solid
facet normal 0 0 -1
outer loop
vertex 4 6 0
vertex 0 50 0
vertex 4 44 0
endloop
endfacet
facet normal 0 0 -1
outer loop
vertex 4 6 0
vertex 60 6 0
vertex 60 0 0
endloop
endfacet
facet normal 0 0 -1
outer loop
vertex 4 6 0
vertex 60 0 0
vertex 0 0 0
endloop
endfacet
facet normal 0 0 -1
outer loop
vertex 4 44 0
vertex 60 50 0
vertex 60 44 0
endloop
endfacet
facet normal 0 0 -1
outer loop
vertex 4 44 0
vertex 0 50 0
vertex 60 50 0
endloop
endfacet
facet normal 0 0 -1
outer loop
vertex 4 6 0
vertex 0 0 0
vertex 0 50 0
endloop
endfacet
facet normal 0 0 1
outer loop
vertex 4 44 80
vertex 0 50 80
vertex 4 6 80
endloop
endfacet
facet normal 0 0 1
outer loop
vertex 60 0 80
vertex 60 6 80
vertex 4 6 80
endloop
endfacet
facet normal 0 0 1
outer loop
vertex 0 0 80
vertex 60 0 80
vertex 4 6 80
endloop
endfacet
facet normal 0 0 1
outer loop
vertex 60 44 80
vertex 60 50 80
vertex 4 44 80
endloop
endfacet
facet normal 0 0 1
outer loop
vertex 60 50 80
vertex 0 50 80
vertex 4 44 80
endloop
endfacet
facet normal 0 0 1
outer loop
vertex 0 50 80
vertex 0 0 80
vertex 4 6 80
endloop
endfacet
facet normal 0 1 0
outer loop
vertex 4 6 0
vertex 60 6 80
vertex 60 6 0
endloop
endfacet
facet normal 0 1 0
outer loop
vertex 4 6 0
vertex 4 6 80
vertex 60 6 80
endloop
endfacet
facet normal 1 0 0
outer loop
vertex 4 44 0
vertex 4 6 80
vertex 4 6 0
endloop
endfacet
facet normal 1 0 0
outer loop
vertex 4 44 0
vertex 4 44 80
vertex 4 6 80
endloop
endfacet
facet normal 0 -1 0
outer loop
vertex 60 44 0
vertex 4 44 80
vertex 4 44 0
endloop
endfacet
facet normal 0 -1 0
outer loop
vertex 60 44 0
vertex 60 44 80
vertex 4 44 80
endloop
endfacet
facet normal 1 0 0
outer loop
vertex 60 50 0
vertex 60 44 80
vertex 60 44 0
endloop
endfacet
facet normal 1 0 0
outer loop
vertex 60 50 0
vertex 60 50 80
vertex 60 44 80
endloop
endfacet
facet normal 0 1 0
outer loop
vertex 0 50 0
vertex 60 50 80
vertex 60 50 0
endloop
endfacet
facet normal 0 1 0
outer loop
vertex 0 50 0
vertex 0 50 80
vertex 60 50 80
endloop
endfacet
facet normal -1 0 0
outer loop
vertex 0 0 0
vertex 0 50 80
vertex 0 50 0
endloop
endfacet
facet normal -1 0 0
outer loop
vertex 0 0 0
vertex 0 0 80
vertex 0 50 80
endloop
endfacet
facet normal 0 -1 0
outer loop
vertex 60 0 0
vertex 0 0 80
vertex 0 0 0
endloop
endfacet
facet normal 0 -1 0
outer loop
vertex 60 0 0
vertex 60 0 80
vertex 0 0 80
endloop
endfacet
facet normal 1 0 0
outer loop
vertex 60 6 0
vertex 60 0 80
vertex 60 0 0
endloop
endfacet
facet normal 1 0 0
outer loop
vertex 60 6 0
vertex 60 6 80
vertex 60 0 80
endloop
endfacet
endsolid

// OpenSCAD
$fn = 32;

// ----------------------------------------------------------------------
// Structural section: channel 60 x 50 mm
// ----------------------------------------------------------------------

// --- parameters (mm) ---
sec_w = 60;               // channel width, X
sec_h = 50;               // channel height, Y
flange_t = 6;             // flange thickness
web_t = 4;                // web thickness
plate_t = 80;             // cut length, Z (extrusion height)

profile = [[0, 0], [60, 0], [60, 6], [4, 6], [4, 44], [60, 44], [60, 50], [0, 50]];  // primary outline, 8 points, counter clockwise

// --- the one profile operation ---
linear_extrude(height = plate_t) polygon(points = profile);
